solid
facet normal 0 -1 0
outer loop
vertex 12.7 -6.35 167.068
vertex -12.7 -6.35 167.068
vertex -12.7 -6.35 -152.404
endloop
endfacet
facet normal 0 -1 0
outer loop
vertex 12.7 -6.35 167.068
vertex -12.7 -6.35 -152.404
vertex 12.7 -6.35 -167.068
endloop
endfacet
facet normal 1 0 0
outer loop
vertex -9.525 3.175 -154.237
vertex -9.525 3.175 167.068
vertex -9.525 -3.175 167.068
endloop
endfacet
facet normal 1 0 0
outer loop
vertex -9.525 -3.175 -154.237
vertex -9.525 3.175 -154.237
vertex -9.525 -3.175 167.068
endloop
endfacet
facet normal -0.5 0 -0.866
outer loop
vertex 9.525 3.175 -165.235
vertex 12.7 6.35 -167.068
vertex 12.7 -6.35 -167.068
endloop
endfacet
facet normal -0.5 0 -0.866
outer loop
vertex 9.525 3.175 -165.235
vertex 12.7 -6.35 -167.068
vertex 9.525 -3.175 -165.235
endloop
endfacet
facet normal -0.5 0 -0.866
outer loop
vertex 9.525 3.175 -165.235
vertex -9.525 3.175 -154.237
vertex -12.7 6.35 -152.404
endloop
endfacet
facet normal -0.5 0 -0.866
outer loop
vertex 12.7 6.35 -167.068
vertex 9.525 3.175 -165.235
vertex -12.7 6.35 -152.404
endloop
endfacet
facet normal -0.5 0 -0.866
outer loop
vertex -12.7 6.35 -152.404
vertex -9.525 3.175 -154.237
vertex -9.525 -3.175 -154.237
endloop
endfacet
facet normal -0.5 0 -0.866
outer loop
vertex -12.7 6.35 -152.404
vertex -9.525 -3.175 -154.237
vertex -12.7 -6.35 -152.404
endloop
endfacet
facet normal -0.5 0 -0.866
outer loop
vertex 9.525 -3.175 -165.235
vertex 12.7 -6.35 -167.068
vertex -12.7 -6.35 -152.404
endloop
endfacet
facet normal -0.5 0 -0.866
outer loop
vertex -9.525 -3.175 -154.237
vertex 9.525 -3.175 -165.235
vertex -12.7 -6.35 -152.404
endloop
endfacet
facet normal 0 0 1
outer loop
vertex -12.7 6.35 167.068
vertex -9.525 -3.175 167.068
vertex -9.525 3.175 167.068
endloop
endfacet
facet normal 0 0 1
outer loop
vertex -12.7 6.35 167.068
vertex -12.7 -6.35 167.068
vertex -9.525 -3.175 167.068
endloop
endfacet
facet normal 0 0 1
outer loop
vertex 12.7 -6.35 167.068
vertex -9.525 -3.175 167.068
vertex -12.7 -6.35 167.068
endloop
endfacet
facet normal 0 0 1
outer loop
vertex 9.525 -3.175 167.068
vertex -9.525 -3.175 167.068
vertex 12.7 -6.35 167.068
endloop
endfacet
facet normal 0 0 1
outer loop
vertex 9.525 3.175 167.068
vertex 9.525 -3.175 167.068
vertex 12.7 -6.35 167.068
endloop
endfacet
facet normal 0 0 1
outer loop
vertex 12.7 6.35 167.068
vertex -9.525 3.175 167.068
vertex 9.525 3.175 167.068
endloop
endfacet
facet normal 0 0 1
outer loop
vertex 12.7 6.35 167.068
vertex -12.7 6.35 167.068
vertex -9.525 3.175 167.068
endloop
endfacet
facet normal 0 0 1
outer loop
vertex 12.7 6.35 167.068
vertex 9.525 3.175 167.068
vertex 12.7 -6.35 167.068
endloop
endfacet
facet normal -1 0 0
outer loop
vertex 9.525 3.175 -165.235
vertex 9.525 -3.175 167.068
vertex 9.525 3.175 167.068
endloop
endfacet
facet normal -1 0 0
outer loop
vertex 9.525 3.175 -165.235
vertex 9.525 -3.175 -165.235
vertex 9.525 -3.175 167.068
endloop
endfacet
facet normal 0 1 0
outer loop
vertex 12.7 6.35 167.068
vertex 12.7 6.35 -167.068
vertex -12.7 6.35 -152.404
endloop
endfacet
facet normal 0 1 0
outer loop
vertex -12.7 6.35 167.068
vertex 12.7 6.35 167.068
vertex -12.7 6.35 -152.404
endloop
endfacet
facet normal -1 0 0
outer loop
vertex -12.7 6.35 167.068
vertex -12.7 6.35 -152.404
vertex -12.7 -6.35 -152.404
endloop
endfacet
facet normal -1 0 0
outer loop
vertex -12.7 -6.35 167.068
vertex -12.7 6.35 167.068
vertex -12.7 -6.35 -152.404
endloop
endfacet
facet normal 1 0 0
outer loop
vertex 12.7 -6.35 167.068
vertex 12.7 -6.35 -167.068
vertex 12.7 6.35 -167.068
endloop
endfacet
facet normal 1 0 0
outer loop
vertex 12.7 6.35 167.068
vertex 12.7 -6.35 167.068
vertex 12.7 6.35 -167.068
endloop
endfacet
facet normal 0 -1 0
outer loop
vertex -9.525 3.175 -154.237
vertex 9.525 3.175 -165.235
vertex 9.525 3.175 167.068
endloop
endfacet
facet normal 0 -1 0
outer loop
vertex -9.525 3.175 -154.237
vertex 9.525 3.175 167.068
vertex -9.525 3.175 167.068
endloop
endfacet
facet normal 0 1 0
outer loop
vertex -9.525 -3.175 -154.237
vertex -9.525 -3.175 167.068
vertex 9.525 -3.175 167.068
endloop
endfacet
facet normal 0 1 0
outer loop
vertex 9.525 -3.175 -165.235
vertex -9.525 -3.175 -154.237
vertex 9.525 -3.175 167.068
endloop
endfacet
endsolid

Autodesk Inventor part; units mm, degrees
ref_plane "YZ Plane" through (0, 0, 0) normal (1, 0, 0) x (0, 1, 0)
ref_plane "XZ Plane" through (0, 0, 0) normal (0, 1, 0) x (-1, 0, 0)
ref_plane "XY Plane" through (0, 0, 0) normal (0, 0, 1) x (1, 0, 0)
sketch "Sketch1" plane through (0, 0, 0) normal (0, 0, 1) x (1, 0, 0)
  line L0 (-12.7, -6.35) -> (12.7, -6.35)
  line L1 (12.7, -6.35) -> (12.7, 6.35)
  line L2 (12.7, 6.35) -> (-12.7, 6.35)
  line L3 (-12.7, 6.35) -> (-12.7, -6.35)
  line L4 (-12.7, -6.35) -> (12.7, 6.35) construction
  line L5 (12.7, -6.35) -> (-12.7, 6.35) construction
  line L6 (-9.525, -3.175) -> (9.525, -3.175)
  line L7 (9.525, -3.175) -> (9.525, 3.175)
  line L8 (9.525, 3.175) -> (-9.525, 3.175)
  line L9 (-9.525, 3.175) -> (-9.525, -3.175)
  line L10 (-9.525, -3.175) -> (9.525, 3.175) construction
  line L11 (9.525, -3.175) -> (-9.525, 3.175) construction
  point P0 (0, 0)
  dimension "d0" = 25.4
  dimension "d1" = 12.7
  dimension "d2" = 3.175
  dimension "d3" = 3.175
extrude "Extrusion1" add sketch "Sketch1" along normal mid plane 334.137
sketch "Sketch2" plane through (-12.7, -6.35, 167.0685) normal (0, -1, 0) x (1, 0, 0)
  line L0 (25.4, -334.137) -> (0, -334.137) projected
  line L1 (25.4, -334.137) -> (0, -319.4723)
  line L2 (0, 0) -> (0, -334.137) projected
  line L3 (0, -334.137) -> (0, -319.4723)
  line L4 (0, -334.137) -> (25.4, -334.137)
  line L5 (22.225, -334.137) -> (22.225, 0) projected
  point P0 (12.7, -167.0685)
  dimension "d6" = 30
extrude "Extrusion2" cut sketch "Sketch2" against normal through all
properties part number "1x0_5x12-aluminumExtrusion" material "Aluminum 6061, Welded"
